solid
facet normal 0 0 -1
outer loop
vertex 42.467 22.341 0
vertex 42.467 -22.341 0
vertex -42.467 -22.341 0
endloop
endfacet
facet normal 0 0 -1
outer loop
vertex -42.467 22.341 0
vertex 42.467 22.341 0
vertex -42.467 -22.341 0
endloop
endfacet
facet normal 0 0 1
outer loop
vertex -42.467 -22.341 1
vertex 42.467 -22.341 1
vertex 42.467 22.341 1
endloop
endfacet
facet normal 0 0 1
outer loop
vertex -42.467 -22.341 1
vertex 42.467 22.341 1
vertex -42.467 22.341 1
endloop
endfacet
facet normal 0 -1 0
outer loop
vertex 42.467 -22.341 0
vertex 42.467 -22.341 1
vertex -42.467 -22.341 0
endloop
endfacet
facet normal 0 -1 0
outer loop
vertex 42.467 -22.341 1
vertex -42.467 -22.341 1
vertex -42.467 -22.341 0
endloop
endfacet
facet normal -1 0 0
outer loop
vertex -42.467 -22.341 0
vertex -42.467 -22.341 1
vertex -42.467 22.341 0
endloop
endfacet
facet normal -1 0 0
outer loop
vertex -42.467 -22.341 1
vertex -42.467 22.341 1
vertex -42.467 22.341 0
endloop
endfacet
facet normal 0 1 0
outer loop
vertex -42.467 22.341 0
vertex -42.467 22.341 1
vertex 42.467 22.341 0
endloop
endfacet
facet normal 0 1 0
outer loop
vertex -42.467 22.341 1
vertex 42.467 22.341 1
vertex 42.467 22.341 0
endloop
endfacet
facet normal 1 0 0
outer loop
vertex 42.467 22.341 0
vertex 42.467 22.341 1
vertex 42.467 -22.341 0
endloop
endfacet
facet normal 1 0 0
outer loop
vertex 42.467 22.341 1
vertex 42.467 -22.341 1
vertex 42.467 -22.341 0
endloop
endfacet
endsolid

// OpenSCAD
// Module names are of the form poly_<inkscape-path-id>().  As a result,
// you can associate a polygon in this OpenSCAD program with the corresponding
// SVG element in the Inkscape document by looking for the XML element with
// the attribute id="inkscape-path-id".

// fudge value is used to ensure that subtracted solids are a tad taller
// in the z dimension than the polygon being subtracted from.  This helps
// keep the resulting .stl file manifold.
fudge = 0.1;

module poly_path825(h)
{
  scale([25.4/90, -25.4/90, 1]) union()
  {
    linear_extrude(height=h)
      polygon([[-150.473696,-79.162648],[150.473696,-79.162648],[150.473696,79.162648],[-150.473696,79.162648]]);
  }
}

module fcu1(h)
{

poly_path825(h);
}

fcu1(1);
